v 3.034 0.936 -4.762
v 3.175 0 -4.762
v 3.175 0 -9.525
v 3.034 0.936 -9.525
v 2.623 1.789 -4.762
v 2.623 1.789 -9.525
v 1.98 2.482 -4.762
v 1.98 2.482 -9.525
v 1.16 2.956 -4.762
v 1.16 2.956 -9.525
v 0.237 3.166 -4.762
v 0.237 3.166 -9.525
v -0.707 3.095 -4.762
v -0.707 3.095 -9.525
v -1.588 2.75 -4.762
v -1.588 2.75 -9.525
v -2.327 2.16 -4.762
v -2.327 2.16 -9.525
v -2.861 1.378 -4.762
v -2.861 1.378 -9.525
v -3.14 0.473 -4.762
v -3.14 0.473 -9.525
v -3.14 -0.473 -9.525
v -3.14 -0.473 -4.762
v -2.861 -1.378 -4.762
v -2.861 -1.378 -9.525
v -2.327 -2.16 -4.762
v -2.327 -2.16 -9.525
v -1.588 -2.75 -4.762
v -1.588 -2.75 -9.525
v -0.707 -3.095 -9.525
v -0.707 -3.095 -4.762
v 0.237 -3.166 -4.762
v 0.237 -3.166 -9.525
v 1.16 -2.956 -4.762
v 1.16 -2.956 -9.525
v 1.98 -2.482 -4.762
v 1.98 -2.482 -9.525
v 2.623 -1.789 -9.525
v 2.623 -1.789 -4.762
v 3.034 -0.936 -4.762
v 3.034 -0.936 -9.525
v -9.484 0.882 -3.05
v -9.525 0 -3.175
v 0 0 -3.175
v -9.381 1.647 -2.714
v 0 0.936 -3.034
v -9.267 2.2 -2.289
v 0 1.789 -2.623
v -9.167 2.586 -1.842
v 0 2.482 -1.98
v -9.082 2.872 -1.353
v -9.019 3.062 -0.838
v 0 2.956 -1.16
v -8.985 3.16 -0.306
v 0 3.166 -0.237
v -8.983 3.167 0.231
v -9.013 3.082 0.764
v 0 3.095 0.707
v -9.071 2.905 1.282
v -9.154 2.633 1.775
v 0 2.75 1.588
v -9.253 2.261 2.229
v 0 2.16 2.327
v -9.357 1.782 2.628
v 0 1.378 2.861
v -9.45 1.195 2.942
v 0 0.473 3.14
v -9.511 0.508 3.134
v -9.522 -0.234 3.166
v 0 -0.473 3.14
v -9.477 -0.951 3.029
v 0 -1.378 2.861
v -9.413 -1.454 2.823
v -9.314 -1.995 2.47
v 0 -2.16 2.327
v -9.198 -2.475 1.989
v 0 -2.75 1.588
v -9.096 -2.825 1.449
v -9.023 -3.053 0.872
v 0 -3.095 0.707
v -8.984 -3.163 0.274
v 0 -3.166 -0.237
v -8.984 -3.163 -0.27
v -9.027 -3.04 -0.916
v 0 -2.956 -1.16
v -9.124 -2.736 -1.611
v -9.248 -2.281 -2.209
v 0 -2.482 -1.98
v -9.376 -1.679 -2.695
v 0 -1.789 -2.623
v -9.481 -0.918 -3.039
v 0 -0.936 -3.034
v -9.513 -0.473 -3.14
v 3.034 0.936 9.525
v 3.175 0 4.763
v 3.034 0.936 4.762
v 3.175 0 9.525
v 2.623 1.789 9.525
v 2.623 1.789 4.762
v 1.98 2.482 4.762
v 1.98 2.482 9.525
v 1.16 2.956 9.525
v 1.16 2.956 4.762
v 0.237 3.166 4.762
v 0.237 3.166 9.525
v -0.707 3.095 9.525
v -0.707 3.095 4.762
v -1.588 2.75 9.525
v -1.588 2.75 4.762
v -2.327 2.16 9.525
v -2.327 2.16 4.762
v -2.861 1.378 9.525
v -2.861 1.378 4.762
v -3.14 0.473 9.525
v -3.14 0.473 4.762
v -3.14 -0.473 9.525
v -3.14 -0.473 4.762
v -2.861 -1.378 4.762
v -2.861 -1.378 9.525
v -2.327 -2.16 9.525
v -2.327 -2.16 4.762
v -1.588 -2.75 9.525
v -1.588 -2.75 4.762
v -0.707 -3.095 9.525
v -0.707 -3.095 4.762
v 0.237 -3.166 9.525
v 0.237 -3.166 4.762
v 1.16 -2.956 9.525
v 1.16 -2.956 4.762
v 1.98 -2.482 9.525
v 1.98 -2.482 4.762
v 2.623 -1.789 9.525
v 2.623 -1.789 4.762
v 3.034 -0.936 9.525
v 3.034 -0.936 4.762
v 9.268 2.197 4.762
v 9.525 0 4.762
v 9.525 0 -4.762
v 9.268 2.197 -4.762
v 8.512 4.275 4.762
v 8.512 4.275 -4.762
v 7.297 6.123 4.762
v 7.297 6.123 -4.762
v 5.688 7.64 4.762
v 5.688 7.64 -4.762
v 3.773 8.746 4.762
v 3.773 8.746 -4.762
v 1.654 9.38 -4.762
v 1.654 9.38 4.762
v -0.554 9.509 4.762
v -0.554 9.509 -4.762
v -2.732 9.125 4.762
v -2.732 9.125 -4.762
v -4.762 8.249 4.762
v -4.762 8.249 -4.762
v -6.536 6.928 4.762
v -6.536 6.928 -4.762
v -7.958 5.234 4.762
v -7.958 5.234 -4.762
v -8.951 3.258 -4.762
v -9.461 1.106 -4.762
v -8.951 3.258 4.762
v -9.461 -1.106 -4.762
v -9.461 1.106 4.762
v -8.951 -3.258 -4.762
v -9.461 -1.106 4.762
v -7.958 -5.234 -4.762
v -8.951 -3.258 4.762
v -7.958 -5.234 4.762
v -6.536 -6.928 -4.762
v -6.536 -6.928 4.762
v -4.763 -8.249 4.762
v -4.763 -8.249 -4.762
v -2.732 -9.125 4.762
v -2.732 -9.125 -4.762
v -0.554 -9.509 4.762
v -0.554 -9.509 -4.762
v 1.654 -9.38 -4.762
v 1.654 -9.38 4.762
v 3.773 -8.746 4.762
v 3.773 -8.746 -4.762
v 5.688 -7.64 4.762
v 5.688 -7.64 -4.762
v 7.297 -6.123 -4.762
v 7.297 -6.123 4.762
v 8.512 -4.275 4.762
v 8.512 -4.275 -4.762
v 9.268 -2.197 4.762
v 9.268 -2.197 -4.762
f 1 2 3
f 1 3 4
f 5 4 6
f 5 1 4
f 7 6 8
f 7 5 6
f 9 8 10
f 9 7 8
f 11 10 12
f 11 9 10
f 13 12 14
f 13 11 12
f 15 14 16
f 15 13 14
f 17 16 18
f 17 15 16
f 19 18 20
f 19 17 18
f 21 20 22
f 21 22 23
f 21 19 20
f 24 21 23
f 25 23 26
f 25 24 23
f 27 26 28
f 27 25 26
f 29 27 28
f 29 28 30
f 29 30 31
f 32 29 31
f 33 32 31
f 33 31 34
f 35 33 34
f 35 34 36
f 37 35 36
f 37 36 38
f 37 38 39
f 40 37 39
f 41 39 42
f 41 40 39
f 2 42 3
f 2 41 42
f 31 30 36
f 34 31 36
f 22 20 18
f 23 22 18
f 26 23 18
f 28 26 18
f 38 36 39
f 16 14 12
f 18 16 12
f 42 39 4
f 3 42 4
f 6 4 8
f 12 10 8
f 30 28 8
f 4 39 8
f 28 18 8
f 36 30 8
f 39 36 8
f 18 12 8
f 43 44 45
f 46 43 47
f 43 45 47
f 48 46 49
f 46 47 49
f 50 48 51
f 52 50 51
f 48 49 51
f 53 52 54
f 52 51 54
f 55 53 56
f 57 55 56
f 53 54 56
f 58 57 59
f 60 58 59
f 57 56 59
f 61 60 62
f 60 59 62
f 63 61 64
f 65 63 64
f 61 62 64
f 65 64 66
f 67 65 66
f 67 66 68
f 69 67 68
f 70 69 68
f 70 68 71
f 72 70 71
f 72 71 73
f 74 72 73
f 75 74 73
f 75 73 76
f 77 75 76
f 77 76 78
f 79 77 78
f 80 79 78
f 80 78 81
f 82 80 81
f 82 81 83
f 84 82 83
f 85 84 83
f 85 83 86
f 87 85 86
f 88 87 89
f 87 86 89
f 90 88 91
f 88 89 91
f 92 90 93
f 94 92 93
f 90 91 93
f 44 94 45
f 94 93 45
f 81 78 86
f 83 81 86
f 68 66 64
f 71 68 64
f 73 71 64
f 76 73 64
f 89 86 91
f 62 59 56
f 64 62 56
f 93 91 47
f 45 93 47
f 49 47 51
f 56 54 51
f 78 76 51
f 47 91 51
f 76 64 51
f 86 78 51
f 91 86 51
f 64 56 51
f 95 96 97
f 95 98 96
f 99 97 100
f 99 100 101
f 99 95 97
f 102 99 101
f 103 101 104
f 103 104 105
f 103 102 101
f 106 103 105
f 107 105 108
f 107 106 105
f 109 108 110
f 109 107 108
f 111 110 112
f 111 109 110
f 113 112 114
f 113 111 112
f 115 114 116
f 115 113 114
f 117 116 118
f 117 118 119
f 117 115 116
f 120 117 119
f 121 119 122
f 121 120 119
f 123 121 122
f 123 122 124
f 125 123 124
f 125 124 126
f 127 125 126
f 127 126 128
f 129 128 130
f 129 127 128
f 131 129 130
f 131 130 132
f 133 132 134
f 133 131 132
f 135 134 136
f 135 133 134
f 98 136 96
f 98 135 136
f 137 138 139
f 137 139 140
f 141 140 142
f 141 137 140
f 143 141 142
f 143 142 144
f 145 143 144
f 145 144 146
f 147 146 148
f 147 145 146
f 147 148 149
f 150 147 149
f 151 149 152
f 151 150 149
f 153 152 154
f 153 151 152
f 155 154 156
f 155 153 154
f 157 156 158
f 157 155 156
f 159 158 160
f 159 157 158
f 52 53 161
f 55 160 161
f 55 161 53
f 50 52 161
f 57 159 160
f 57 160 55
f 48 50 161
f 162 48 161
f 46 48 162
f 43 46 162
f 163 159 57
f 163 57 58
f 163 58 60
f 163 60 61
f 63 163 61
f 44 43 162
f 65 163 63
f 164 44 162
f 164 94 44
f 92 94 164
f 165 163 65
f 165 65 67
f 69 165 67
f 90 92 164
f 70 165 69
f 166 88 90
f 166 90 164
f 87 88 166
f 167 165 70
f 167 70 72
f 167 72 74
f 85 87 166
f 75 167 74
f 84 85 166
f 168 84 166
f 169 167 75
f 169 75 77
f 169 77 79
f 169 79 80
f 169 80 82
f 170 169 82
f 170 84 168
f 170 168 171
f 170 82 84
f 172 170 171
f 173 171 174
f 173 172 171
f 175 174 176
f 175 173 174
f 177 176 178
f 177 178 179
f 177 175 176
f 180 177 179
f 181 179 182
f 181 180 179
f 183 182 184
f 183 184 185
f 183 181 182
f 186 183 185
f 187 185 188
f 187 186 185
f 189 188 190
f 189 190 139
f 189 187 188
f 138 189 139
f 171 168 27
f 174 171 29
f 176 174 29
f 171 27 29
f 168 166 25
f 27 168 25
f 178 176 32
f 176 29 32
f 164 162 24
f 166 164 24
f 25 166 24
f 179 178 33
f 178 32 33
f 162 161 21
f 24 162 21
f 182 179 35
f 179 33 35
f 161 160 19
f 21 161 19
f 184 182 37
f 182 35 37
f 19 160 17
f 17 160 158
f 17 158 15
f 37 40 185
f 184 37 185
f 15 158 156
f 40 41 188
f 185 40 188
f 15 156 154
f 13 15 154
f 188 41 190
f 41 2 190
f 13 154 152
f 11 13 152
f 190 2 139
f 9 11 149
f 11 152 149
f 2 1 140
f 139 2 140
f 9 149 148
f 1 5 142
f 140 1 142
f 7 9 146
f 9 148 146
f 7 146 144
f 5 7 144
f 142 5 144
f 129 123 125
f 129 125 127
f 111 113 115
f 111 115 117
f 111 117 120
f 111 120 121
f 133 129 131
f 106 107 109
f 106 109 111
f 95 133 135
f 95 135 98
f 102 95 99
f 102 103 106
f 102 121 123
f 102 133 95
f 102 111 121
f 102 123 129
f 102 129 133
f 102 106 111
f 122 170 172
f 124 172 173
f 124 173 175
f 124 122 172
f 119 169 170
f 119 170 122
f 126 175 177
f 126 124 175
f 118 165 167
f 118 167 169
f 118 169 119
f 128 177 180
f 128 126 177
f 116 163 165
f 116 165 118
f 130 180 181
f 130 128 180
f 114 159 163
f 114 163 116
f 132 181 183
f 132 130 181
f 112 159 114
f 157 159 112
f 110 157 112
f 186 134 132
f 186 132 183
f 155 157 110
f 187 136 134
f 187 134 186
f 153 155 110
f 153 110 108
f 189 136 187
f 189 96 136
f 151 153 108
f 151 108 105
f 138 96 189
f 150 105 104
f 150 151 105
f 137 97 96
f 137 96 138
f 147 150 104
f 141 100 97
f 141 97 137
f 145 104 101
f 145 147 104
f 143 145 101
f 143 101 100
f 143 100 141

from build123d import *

# Parameters (mm, degrees)
SKETCH2_R           = 9.525
BOSS_EXTRUDE2_DEPTH = 4.7625
SKETCH5_R           = 3.175
BOSS_EXTRUDE3_DEPTH = 9.525
SKETCH6_R           = 3.175
CUT_EXTRUDE3_DEPTH  = 10.525


with BuildPart() as part:
    # Sketch2 → Boss-Extrude2 (new body, symmetric)
    with BuildSketch(Plane.XY):
        Circle(SKETCH2_R)
    extrude(amount=BOSS_EXTRUDE2_DEPTH, both=True)

    # Sketch5 → Boss-Extrude3 (add, symmetric)
    with BuildSketch(Plane.XY):
        Circle(SKETCH5_R)
    extrude(amount=BOSS_EXTRUDE3_DEPTH, both=True)

    # Sketch6 → Cut-Extrude3 (cut, through all)
    with BuildSketch(Plane(origin=(0, 0, 0), x_dir=(0, 0, -1), z_dir=(1, 0, 0))):
        Circle(SKETCH6_R)
    extrude(amount=-CUT_EXTRUDE3_DEPTH, mode=Mode.SUBTRACT)


solid = part.part
